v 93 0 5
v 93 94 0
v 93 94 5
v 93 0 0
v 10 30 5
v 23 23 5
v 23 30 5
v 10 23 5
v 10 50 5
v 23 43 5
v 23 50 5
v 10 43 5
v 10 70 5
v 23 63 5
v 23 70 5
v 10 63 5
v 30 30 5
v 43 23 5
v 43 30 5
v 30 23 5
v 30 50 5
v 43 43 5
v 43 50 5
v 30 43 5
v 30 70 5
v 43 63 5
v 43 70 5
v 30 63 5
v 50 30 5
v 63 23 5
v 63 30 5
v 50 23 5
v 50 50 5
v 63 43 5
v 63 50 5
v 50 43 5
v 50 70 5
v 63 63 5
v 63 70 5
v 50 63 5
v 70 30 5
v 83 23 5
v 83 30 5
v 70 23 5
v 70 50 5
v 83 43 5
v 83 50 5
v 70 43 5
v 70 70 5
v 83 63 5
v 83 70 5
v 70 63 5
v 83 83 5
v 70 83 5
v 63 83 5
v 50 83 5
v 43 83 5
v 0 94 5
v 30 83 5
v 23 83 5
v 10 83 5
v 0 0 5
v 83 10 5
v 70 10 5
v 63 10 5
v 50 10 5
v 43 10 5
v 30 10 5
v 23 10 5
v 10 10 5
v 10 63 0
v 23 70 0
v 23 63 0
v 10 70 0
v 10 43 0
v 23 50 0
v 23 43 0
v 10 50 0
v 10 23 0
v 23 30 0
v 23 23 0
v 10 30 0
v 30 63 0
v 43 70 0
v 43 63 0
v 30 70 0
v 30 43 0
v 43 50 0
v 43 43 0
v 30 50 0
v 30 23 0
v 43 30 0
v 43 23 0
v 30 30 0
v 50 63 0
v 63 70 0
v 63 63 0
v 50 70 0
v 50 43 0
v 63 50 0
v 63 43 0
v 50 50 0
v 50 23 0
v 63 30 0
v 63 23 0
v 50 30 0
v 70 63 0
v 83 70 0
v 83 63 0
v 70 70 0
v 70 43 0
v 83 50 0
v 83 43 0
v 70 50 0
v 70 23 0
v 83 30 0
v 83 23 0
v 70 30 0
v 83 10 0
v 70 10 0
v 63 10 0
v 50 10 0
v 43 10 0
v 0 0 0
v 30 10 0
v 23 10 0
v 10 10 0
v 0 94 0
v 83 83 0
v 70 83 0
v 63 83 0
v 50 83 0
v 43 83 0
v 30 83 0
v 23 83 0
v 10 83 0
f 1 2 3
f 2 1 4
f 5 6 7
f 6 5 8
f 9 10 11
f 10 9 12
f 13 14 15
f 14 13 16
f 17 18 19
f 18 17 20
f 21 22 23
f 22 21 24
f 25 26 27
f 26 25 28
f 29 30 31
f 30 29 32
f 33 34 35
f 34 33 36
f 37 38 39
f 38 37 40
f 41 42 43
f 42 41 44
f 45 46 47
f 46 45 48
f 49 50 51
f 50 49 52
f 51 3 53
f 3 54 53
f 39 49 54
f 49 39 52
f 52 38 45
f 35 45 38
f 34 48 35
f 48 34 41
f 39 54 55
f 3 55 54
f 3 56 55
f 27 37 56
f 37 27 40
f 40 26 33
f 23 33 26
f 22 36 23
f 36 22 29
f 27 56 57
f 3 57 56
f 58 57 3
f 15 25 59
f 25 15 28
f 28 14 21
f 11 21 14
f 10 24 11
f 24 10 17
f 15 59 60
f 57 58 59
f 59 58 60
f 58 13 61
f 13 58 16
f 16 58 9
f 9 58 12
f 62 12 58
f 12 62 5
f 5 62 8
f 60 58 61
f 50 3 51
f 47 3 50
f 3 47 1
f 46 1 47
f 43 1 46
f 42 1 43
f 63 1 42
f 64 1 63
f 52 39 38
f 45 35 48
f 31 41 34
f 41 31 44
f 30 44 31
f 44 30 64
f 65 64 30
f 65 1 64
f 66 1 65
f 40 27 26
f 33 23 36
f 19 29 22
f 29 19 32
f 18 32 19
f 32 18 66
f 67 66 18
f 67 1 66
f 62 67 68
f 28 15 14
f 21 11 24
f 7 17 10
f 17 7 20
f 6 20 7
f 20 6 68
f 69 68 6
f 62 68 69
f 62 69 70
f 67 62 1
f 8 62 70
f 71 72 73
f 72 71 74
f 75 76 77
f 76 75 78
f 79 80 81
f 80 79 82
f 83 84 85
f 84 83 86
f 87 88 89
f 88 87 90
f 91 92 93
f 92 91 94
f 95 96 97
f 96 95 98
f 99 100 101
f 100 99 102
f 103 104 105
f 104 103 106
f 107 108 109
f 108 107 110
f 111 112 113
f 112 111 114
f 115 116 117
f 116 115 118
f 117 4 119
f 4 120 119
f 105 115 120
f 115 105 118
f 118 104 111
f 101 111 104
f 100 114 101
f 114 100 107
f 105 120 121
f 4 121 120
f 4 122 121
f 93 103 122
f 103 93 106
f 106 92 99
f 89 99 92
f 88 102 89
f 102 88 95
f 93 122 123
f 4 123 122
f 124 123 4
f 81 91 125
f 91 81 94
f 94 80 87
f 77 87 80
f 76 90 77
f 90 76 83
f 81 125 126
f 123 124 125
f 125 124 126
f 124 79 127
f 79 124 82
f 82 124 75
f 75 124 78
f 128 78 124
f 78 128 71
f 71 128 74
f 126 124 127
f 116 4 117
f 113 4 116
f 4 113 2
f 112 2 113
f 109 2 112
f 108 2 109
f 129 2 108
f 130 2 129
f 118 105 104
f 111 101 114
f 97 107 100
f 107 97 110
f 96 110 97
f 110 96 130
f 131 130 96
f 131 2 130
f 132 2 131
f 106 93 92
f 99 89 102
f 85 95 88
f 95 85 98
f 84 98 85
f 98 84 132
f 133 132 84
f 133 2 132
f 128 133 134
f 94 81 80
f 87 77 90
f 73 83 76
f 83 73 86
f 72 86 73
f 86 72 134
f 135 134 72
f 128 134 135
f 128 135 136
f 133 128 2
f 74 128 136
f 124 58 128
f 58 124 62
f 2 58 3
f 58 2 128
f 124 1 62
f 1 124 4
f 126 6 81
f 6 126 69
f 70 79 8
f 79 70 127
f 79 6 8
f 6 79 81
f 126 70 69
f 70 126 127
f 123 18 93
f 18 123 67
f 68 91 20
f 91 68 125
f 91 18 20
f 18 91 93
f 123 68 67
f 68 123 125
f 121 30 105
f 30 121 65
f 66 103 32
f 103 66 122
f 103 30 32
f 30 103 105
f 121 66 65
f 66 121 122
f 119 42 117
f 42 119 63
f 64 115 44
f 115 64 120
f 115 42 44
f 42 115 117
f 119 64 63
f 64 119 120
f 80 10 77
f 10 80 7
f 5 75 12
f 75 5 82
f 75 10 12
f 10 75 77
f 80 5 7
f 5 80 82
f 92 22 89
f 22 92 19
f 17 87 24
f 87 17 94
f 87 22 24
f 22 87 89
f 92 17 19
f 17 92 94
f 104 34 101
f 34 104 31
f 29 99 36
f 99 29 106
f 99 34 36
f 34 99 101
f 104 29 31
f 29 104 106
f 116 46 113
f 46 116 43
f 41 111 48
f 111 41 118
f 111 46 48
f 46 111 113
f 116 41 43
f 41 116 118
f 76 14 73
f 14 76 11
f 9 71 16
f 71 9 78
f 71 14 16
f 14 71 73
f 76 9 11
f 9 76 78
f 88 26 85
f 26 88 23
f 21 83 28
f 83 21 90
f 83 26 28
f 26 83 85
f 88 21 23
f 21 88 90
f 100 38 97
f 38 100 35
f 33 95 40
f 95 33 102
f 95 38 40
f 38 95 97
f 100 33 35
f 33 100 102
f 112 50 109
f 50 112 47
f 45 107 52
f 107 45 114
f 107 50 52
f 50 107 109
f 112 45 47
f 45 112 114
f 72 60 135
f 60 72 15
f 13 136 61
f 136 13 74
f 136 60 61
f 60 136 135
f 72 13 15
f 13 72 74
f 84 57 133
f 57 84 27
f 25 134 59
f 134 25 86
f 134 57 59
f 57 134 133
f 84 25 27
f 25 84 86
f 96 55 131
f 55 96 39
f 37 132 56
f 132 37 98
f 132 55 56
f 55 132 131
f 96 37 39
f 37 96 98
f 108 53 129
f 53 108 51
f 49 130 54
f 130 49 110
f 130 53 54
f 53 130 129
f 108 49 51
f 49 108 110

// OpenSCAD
w = 93;
d = 94;
h = 5;

difference(){
cube([w,d,h]);

difference(){
    translate([+10,+10,-1])
    color("red")cube([13,13,8]);
    }
difference(){
    translate([+30,+10,-1])
    color("red")cube([13,13,8]);
    }
difference(){
    translate([+50,+10,-1])
    color("red")cube([13,13,8]);
    }
difference(){
    translate([+70,+10,-1])
    color("red")cube([13,13,8]);
    } 
difference(){
    translate([+10,+30,-1])
    color("red")cube([13,13,8]);
    } 
difference(){
    translate([+30,+30,-1])
    color("red")cube([13,13,8]);
    }
difference(){
    translate([+50,+30,-1])
    color("red")cube([13,13,8]);
    }
difference(){
    translate([+70,+30,-1])
    color("red")cube([13,13,8]);
    }
difference(){
    translate([+10,+50,-1])
    color("red")cube([13,13,8]);
    }
difference(){
    translate([+30,+50,-1])
    color("red")cube([13,13,8]);
    }
difference(){
    translate([+50,+50,-1])
    color("red")cube([13,13,8]);
    }
difference(){
    translate([+70,+50,-1])
    color("red")cube([13,13,8]);
    }
difference(){
    translate([+10,+70,-1])
    color("red")cube([13,13,8]);
    }
difference(){
    translate([+30,+70,-1])
    color("red")cube([13,13,8]);
    }
difference(){
    translate([+50,+70,-1])
    color("red")cube([13,13,8]);
    }
difference(){
    translate([+70,+70,-1])
    color("red")cube([13,13,8]);
    }
}
